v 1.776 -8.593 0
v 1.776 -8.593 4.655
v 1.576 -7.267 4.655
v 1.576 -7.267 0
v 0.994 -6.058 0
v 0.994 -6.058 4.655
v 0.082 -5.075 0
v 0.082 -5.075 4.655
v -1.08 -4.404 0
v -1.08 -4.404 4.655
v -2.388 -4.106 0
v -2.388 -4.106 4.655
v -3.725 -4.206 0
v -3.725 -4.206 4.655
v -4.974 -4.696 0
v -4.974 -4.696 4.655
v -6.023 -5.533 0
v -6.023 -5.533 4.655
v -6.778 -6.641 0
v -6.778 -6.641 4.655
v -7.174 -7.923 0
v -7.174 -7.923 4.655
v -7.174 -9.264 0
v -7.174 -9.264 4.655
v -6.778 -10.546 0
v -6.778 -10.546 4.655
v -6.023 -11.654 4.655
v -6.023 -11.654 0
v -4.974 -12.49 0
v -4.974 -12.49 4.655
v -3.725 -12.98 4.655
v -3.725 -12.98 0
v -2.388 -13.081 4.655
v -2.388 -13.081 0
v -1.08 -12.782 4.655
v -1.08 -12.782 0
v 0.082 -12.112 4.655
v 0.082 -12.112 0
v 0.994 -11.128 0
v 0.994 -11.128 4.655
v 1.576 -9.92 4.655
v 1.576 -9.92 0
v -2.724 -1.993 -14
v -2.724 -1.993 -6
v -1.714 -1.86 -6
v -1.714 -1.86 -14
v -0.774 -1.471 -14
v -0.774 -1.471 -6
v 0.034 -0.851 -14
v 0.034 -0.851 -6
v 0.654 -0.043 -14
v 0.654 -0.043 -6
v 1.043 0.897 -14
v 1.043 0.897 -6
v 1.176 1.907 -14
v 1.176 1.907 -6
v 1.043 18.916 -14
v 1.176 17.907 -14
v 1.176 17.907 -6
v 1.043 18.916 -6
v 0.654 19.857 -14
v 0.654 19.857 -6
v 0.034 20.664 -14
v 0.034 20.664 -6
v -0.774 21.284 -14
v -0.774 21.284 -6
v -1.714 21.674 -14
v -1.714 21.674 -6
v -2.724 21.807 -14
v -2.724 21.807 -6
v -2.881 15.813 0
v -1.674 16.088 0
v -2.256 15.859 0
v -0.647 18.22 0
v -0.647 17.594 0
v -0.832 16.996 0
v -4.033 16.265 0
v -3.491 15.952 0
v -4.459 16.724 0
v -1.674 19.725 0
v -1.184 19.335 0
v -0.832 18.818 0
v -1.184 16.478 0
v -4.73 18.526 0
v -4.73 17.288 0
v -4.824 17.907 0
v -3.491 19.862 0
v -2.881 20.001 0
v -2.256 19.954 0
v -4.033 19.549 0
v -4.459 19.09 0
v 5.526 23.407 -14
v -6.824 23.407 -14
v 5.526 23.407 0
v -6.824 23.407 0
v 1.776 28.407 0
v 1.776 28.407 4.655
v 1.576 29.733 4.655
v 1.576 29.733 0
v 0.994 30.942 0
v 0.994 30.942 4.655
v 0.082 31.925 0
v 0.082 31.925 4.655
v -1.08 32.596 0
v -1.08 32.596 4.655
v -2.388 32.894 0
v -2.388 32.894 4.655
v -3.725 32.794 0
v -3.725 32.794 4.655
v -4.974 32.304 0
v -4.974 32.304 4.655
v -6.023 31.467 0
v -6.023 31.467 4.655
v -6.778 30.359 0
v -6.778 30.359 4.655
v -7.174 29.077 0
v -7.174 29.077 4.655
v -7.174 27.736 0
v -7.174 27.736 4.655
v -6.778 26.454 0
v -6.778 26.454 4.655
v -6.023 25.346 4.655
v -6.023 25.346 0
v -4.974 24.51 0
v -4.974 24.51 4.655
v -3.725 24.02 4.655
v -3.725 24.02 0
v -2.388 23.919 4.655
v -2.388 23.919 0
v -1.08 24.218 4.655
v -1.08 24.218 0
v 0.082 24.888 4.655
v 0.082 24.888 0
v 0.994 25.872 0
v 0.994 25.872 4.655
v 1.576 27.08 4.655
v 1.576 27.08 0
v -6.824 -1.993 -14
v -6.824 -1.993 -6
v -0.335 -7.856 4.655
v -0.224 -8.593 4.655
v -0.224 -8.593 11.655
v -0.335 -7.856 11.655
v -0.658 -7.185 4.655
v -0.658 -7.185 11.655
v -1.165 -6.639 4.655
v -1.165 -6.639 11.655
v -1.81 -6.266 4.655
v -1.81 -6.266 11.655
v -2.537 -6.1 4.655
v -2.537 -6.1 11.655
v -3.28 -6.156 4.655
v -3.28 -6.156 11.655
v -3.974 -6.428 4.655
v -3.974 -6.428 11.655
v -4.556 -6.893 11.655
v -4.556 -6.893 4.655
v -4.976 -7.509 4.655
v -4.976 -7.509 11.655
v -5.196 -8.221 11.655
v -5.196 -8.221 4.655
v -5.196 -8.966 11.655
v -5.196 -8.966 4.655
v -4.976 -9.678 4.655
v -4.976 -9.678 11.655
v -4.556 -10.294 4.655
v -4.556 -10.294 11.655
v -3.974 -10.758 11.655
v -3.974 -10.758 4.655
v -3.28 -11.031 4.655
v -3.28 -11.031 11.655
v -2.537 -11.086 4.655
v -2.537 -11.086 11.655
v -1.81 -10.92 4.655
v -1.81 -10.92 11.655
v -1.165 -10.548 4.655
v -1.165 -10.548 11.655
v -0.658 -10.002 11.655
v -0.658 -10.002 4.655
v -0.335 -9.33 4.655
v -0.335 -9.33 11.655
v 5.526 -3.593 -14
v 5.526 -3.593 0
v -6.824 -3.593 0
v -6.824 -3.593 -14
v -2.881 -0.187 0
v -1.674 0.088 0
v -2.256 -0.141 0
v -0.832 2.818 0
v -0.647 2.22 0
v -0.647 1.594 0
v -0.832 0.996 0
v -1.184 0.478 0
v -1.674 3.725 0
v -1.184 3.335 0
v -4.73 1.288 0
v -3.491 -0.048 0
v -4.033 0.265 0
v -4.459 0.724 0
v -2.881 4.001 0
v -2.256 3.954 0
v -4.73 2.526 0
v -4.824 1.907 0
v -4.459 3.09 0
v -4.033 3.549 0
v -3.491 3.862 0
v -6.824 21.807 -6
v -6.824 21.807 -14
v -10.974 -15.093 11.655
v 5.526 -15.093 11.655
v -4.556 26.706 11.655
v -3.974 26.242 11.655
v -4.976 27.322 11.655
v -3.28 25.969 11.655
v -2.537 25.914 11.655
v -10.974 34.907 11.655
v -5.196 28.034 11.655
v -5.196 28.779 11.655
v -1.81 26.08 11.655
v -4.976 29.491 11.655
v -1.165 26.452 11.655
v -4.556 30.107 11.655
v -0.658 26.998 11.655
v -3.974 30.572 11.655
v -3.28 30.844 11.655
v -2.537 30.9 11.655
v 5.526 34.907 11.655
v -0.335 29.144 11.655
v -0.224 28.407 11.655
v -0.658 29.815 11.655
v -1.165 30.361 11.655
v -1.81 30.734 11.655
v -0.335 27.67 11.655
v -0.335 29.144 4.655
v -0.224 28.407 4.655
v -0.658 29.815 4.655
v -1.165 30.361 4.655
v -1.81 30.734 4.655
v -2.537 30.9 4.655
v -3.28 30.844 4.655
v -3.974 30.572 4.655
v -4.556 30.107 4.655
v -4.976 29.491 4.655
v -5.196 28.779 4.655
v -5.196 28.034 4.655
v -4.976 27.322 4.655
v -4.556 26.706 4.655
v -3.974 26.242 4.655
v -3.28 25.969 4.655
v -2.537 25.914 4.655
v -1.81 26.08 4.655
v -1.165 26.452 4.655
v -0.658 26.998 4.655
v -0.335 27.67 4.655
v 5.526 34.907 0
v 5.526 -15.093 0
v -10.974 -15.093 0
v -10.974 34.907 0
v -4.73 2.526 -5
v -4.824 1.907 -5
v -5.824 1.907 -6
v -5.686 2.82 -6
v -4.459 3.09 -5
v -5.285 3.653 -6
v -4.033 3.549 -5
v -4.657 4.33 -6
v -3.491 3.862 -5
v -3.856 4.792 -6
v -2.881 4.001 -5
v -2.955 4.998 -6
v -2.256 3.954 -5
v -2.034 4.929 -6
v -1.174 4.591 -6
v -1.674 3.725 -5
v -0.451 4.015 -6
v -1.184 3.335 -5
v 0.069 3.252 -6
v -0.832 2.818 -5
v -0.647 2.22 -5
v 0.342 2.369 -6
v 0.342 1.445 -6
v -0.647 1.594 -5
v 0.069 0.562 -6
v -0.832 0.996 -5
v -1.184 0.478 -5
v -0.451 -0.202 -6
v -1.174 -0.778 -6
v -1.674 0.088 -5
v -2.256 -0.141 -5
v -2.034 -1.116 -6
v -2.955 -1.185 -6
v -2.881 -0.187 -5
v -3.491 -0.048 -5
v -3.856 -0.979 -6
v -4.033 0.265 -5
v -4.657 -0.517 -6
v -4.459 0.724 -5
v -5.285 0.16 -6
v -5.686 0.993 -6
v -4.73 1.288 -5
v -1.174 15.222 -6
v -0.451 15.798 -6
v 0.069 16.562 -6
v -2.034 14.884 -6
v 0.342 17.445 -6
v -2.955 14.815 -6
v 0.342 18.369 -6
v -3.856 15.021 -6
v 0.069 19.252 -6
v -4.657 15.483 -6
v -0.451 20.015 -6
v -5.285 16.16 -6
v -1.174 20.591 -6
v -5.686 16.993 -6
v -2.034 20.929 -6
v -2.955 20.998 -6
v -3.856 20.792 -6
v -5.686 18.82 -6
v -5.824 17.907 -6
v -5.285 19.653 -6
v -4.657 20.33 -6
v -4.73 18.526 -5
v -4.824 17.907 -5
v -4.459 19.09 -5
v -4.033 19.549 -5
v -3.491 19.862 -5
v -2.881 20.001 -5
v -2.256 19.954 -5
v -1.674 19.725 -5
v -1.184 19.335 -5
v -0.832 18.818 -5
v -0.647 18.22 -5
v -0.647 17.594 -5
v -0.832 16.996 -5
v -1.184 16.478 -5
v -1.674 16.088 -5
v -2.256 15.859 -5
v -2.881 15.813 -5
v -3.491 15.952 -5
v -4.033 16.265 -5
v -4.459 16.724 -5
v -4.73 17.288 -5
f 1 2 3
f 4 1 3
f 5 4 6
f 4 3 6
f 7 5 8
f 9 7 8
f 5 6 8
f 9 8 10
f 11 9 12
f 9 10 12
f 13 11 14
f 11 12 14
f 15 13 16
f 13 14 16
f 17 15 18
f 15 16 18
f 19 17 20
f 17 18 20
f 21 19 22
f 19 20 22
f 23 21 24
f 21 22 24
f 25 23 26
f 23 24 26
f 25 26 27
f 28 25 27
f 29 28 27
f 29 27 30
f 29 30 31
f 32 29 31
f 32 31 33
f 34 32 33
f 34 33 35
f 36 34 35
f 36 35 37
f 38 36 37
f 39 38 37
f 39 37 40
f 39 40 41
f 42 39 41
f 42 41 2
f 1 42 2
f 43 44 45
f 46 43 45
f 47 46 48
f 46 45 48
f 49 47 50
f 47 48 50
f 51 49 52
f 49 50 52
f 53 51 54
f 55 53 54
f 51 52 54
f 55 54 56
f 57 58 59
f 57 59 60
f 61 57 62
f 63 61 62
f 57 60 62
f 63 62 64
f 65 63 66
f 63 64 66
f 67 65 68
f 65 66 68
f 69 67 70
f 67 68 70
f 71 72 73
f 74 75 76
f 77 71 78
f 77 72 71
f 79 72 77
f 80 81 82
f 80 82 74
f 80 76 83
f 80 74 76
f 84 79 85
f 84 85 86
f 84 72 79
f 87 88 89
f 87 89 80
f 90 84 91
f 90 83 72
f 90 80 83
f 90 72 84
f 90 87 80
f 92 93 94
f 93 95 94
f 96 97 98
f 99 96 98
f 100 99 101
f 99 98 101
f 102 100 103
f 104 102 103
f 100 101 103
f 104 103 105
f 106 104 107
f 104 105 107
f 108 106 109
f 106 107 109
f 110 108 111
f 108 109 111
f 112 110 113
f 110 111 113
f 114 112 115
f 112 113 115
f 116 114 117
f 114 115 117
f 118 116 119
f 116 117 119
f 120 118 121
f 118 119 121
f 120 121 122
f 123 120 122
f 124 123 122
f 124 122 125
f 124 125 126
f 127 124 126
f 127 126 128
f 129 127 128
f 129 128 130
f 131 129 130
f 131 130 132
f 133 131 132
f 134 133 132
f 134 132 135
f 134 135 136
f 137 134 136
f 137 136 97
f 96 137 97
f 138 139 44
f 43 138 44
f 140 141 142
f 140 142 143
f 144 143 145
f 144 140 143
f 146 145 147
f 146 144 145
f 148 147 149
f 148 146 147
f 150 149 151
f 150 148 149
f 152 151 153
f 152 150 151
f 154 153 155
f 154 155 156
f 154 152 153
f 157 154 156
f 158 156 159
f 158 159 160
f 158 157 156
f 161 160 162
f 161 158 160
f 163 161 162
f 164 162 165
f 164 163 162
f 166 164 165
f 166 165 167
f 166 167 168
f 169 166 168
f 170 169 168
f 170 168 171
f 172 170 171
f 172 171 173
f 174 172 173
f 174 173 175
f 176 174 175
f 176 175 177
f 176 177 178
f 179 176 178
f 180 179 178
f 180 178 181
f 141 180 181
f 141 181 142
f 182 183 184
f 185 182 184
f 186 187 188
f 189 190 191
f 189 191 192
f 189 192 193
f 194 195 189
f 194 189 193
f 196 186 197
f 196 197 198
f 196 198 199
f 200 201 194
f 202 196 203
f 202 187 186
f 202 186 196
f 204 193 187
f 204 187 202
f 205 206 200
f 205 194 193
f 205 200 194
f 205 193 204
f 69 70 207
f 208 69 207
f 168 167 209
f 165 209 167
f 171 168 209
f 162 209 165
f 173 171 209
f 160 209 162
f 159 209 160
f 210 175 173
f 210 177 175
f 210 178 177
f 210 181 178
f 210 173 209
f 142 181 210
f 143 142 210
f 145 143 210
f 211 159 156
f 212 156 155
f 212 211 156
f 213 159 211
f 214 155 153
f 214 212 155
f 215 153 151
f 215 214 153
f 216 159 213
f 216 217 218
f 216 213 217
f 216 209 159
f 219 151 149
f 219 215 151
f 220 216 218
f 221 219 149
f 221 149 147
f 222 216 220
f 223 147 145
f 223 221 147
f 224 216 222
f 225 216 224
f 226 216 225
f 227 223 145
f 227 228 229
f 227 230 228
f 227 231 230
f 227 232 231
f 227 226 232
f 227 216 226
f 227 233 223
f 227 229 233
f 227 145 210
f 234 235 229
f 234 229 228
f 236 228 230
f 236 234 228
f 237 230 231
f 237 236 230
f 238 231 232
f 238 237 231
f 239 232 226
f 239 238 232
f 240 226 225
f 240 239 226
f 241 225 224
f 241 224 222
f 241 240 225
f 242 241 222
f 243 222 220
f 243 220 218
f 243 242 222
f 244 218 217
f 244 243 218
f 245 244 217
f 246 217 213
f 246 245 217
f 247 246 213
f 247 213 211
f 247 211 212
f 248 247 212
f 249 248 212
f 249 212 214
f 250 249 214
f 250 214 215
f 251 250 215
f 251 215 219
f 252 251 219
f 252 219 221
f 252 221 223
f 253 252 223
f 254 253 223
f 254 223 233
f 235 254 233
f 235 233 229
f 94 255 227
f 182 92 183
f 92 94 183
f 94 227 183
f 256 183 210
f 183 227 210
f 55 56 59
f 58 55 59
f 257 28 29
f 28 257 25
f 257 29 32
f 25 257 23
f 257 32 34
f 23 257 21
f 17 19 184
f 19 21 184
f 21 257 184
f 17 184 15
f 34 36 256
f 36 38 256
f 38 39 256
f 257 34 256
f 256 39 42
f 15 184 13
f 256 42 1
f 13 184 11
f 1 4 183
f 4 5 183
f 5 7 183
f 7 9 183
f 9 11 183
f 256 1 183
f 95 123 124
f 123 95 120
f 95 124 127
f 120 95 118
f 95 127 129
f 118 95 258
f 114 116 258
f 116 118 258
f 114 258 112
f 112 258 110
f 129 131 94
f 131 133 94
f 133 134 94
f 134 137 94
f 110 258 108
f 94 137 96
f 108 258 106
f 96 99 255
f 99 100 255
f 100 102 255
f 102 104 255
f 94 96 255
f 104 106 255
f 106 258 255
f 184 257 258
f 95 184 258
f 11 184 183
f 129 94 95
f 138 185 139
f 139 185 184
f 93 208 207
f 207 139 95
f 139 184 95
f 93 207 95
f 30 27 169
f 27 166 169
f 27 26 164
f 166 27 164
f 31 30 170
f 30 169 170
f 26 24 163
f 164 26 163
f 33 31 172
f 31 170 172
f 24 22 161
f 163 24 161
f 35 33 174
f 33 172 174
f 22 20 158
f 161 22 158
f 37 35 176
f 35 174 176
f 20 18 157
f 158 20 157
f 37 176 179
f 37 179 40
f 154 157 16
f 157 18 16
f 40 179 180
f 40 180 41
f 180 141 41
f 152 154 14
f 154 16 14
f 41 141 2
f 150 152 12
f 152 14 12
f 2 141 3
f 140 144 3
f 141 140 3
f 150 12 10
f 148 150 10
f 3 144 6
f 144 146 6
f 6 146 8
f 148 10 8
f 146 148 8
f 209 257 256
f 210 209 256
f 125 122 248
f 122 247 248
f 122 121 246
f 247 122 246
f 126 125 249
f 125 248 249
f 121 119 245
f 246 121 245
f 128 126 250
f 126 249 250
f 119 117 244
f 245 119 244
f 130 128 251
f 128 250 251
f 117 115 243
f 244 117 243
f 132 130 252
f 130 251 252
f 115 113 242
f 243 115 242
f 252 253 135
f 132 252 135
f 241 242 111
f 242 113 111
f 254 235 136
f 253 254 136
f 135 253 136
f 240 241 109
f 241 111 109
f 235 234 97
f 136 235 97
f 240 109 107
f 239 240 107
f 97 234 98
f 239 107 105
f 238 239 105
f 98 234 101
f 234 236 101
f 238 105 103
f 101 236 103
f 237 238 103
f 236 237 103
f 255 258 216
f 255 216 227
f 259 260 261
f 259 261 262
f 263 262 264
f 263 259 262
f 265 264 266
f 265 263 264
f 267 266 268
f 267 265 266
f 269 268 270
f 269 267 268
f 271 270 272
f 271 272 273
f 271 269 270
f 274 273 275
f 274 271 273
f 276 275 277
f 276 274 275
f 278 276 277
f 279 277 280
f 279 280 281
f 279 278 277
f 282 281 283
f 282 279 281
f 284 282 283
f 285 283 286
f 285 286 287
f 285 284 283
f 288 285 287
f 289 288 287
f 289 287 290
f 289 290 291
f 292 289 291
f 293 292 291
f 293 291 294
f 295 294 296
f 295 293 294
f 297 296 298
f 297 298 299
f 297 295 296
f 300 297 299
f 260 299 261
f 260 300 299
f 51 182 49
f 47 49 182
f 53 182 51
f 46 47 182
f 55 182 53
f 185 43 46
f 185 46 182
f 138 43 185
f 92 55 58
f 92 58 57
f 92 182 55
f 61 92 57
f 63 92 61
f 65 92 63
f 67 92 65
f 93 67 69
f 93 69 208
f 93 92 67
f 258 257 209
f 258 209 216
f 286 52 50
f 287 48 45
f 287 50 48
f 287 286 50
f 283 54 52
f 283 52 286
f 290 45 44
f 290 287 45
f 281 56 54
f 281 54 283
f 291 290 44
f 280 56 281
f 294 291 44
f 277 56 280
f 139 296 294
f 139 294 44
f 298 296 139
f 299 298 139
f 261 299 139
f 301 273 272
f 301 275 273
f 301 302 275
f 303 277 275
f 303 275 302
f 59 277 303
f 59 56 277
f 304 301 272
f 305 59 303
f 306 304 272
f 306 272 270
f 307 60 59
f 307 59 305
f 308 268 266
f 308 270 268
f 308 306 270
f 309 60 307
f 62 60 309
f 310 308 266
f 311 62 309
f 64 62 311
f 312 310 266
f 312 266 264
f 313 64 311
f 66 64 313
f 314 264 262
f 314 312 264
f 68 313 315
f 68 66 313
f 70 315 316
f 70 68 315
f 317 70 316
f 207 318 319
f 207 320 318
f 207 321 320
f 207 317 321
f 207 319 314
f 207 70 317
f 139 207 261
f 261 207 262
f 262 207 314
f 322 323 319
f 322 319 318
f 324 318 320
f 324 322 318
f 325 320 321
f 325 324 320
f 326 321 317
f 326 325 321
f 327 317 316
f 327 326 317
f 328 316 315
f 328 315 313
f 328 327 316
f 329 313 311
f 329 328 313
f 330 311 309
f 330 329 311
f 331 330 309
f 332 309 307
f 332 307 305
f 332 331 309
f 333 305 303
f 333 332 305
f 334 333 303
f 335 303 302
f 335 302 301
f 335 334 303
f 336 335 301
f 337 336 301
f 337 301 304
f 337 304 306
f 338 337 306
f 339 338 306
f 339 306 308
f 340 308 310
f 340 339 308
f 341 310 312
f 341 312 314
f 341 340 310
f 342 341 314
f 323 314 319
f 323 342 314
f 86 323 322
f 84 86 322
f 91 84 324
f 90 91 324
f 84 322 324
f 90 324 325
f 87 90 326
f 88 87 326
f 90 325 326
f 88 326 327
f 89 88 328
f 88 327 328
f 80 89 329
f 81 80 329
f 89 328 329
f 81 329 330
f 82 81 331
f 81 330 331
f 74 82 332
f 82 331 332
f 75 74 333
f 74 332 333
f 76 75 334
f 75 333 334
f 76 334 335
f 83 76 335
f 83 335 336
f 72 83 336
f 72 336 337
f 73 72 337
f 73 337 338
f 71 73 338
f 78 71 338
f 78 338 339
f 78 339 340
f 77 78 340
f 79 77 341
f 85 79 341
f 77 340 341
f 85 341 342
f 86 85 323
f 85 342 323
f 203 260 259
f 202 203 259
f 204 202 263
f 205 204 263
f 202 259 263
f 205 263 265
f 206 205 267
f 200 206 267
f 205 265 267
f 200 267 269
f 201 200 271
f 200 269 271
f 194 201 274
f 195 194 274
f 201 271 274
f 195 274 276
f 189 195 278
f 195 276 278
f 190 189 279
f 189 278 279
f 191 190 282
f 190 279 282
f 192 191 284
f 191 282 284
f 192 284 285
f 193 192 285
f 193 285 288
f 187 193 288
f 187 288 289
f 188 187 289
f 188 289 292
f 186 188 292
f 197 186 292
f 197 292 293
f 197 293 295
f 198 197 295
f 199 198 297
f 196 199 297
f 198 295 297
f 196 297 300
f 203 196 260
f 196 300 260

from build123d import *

# Parameters (mm, degrees)
SKETCH2_W           = 16.5
SKETCH2_H           = 50
SKETCH2_R           = 2.5
BOSS_EXTRUDE1_DEPTH = 11.655
CUT_EXTRUDE3_START  = -7
SKETCH4_R           = 4.5
CUT_EXTRUDE3_DEPTH  = 10
SKETCH6_W           = 12.35
SKETCH6_H           = 27
BOSS_EXTRUDE2_DEPTH = 6
SKETCH7_R           = 2.1
CUT_EXTRUDE4_DEPTH  = 6
CHAMFER1_SIZE       = 1
BOSS_EXTRUDE3_DEPTH = 8


with BuildPart() as part:
    # Sketch2 → Boss-Extrude1 (new body)
    with BuildSketch(Plane.XY):
        with Locations((-2.723788813, 9.906715388)):
            Rectangle(SKETCH2_W, SKETCH2_H)
        with Locations((-2.723788813, -8.593284612)):
            Circle(SKETCH2_R, mode=Mode.SUBTRACT)
        with Locations((-2.723788813, 28.406715388)):
            Circle(SKETCH2_R, mode=Mode.SUBTRACT)
    extrude(amount=BOSS_EXTRUDE1_DEPTH)

    # Sketch4 → Cut-Extrude3 (cut)
    with BuildSketch(Plane.XY.offset(11.655).offset(CUT_EXTRUDE3_START)):
        with Locations((-2.723788813, 28.406715388)):
            Circle(SKETCH4_R)
        with Locations((-2.723788813, -8.593284612)):
            Circle(SKETCH4_R)
    extrude(amount=-CUT_EXTRUDE3_DEPTH, mode=Mode.SUBTRACT)

    # Sketch6 → Boss-Extrude2 (add)
    with BuildSketch(Plane(origin=(0, 0, 0), x_dir=(-1, 0, 0), z_dir=(0, 0, -1))):
        with Locations((0.648788813, 9.906715388)):
            Rectangle(SKETCH6_W, SKETCH6_H)
    extrude(amount=BOSS_EXTRUDE2_DEPTH)

    # Sketch7 → Cut-Extrude4 (cut)
    with BuildSketch(Plane(origin=(0, 0, -6), x_dir=(-1, 0, 0), z_dir=(0, 0, -1))):
        with Locations((2.723788813, 17.906715388)):
            Circle(SKETCH7_R)
        with Locations((2.723788813, 1.906715388)):
            Circle(SKETCH7_R)
    extrude(amount=-CUT_EXTRUDE4_DEPTH, mode=Mode.SUBTRACT)

    # Chamfer1
    chamfer1_edges = [part.edges().sort_by_distance(p)[0] for p in [
        (-0.623788813, 17.906715388, -6),
        (-0.623788813, 1.906715388, -6),
    ]]
    chamfer(chamfer1_edges, length=CHAMFER1_SIZE)

    # Sketch8 → Boss-Extrude3 (add)
    with BuildSketch(Plane(origin=(0, 0, -6), x_dir=(-1, 0, 0), z_dir=(0, 0, -1))):
        with BuildLine():
            Line((6.823788813, 21.806715388), (6.823788813, 23.406715388))
            Line((6.823788813, 23.406715388), (-5.526211187, 23.406715388))
            Line((-5.526211187, 23.406715388), (-5.526211187, -3.593284612))
            Line((-5.526211187, -3.593284612), (6.823788813, -3.593284612))
            Line((6.823788813, -3.593284612), (6.823788813, -1.993284612))
            Line((6.823788813, -1.993284612), (2.723788813, -1.993284612))
            ThreePointArc((2.723788813, -1.993284612), (-0.033927633, -0.851001059), (-1.176211187, 1.906715388))
            Line((-1.176211187, 1.906715388), (-1.176211187, 17.906715388))
            ThreePointArc((-1.176211187, 17.906715388), (-0.033927633, 20.664431835), (2.723788813, 21.806715388))
            Line((2.723788813, 21.806715388), (6.823788813, 21.806715388))
        make_face()
    extrude(amount=BOSS_EXTRUDE3_DEPTH)


solid = part.part
